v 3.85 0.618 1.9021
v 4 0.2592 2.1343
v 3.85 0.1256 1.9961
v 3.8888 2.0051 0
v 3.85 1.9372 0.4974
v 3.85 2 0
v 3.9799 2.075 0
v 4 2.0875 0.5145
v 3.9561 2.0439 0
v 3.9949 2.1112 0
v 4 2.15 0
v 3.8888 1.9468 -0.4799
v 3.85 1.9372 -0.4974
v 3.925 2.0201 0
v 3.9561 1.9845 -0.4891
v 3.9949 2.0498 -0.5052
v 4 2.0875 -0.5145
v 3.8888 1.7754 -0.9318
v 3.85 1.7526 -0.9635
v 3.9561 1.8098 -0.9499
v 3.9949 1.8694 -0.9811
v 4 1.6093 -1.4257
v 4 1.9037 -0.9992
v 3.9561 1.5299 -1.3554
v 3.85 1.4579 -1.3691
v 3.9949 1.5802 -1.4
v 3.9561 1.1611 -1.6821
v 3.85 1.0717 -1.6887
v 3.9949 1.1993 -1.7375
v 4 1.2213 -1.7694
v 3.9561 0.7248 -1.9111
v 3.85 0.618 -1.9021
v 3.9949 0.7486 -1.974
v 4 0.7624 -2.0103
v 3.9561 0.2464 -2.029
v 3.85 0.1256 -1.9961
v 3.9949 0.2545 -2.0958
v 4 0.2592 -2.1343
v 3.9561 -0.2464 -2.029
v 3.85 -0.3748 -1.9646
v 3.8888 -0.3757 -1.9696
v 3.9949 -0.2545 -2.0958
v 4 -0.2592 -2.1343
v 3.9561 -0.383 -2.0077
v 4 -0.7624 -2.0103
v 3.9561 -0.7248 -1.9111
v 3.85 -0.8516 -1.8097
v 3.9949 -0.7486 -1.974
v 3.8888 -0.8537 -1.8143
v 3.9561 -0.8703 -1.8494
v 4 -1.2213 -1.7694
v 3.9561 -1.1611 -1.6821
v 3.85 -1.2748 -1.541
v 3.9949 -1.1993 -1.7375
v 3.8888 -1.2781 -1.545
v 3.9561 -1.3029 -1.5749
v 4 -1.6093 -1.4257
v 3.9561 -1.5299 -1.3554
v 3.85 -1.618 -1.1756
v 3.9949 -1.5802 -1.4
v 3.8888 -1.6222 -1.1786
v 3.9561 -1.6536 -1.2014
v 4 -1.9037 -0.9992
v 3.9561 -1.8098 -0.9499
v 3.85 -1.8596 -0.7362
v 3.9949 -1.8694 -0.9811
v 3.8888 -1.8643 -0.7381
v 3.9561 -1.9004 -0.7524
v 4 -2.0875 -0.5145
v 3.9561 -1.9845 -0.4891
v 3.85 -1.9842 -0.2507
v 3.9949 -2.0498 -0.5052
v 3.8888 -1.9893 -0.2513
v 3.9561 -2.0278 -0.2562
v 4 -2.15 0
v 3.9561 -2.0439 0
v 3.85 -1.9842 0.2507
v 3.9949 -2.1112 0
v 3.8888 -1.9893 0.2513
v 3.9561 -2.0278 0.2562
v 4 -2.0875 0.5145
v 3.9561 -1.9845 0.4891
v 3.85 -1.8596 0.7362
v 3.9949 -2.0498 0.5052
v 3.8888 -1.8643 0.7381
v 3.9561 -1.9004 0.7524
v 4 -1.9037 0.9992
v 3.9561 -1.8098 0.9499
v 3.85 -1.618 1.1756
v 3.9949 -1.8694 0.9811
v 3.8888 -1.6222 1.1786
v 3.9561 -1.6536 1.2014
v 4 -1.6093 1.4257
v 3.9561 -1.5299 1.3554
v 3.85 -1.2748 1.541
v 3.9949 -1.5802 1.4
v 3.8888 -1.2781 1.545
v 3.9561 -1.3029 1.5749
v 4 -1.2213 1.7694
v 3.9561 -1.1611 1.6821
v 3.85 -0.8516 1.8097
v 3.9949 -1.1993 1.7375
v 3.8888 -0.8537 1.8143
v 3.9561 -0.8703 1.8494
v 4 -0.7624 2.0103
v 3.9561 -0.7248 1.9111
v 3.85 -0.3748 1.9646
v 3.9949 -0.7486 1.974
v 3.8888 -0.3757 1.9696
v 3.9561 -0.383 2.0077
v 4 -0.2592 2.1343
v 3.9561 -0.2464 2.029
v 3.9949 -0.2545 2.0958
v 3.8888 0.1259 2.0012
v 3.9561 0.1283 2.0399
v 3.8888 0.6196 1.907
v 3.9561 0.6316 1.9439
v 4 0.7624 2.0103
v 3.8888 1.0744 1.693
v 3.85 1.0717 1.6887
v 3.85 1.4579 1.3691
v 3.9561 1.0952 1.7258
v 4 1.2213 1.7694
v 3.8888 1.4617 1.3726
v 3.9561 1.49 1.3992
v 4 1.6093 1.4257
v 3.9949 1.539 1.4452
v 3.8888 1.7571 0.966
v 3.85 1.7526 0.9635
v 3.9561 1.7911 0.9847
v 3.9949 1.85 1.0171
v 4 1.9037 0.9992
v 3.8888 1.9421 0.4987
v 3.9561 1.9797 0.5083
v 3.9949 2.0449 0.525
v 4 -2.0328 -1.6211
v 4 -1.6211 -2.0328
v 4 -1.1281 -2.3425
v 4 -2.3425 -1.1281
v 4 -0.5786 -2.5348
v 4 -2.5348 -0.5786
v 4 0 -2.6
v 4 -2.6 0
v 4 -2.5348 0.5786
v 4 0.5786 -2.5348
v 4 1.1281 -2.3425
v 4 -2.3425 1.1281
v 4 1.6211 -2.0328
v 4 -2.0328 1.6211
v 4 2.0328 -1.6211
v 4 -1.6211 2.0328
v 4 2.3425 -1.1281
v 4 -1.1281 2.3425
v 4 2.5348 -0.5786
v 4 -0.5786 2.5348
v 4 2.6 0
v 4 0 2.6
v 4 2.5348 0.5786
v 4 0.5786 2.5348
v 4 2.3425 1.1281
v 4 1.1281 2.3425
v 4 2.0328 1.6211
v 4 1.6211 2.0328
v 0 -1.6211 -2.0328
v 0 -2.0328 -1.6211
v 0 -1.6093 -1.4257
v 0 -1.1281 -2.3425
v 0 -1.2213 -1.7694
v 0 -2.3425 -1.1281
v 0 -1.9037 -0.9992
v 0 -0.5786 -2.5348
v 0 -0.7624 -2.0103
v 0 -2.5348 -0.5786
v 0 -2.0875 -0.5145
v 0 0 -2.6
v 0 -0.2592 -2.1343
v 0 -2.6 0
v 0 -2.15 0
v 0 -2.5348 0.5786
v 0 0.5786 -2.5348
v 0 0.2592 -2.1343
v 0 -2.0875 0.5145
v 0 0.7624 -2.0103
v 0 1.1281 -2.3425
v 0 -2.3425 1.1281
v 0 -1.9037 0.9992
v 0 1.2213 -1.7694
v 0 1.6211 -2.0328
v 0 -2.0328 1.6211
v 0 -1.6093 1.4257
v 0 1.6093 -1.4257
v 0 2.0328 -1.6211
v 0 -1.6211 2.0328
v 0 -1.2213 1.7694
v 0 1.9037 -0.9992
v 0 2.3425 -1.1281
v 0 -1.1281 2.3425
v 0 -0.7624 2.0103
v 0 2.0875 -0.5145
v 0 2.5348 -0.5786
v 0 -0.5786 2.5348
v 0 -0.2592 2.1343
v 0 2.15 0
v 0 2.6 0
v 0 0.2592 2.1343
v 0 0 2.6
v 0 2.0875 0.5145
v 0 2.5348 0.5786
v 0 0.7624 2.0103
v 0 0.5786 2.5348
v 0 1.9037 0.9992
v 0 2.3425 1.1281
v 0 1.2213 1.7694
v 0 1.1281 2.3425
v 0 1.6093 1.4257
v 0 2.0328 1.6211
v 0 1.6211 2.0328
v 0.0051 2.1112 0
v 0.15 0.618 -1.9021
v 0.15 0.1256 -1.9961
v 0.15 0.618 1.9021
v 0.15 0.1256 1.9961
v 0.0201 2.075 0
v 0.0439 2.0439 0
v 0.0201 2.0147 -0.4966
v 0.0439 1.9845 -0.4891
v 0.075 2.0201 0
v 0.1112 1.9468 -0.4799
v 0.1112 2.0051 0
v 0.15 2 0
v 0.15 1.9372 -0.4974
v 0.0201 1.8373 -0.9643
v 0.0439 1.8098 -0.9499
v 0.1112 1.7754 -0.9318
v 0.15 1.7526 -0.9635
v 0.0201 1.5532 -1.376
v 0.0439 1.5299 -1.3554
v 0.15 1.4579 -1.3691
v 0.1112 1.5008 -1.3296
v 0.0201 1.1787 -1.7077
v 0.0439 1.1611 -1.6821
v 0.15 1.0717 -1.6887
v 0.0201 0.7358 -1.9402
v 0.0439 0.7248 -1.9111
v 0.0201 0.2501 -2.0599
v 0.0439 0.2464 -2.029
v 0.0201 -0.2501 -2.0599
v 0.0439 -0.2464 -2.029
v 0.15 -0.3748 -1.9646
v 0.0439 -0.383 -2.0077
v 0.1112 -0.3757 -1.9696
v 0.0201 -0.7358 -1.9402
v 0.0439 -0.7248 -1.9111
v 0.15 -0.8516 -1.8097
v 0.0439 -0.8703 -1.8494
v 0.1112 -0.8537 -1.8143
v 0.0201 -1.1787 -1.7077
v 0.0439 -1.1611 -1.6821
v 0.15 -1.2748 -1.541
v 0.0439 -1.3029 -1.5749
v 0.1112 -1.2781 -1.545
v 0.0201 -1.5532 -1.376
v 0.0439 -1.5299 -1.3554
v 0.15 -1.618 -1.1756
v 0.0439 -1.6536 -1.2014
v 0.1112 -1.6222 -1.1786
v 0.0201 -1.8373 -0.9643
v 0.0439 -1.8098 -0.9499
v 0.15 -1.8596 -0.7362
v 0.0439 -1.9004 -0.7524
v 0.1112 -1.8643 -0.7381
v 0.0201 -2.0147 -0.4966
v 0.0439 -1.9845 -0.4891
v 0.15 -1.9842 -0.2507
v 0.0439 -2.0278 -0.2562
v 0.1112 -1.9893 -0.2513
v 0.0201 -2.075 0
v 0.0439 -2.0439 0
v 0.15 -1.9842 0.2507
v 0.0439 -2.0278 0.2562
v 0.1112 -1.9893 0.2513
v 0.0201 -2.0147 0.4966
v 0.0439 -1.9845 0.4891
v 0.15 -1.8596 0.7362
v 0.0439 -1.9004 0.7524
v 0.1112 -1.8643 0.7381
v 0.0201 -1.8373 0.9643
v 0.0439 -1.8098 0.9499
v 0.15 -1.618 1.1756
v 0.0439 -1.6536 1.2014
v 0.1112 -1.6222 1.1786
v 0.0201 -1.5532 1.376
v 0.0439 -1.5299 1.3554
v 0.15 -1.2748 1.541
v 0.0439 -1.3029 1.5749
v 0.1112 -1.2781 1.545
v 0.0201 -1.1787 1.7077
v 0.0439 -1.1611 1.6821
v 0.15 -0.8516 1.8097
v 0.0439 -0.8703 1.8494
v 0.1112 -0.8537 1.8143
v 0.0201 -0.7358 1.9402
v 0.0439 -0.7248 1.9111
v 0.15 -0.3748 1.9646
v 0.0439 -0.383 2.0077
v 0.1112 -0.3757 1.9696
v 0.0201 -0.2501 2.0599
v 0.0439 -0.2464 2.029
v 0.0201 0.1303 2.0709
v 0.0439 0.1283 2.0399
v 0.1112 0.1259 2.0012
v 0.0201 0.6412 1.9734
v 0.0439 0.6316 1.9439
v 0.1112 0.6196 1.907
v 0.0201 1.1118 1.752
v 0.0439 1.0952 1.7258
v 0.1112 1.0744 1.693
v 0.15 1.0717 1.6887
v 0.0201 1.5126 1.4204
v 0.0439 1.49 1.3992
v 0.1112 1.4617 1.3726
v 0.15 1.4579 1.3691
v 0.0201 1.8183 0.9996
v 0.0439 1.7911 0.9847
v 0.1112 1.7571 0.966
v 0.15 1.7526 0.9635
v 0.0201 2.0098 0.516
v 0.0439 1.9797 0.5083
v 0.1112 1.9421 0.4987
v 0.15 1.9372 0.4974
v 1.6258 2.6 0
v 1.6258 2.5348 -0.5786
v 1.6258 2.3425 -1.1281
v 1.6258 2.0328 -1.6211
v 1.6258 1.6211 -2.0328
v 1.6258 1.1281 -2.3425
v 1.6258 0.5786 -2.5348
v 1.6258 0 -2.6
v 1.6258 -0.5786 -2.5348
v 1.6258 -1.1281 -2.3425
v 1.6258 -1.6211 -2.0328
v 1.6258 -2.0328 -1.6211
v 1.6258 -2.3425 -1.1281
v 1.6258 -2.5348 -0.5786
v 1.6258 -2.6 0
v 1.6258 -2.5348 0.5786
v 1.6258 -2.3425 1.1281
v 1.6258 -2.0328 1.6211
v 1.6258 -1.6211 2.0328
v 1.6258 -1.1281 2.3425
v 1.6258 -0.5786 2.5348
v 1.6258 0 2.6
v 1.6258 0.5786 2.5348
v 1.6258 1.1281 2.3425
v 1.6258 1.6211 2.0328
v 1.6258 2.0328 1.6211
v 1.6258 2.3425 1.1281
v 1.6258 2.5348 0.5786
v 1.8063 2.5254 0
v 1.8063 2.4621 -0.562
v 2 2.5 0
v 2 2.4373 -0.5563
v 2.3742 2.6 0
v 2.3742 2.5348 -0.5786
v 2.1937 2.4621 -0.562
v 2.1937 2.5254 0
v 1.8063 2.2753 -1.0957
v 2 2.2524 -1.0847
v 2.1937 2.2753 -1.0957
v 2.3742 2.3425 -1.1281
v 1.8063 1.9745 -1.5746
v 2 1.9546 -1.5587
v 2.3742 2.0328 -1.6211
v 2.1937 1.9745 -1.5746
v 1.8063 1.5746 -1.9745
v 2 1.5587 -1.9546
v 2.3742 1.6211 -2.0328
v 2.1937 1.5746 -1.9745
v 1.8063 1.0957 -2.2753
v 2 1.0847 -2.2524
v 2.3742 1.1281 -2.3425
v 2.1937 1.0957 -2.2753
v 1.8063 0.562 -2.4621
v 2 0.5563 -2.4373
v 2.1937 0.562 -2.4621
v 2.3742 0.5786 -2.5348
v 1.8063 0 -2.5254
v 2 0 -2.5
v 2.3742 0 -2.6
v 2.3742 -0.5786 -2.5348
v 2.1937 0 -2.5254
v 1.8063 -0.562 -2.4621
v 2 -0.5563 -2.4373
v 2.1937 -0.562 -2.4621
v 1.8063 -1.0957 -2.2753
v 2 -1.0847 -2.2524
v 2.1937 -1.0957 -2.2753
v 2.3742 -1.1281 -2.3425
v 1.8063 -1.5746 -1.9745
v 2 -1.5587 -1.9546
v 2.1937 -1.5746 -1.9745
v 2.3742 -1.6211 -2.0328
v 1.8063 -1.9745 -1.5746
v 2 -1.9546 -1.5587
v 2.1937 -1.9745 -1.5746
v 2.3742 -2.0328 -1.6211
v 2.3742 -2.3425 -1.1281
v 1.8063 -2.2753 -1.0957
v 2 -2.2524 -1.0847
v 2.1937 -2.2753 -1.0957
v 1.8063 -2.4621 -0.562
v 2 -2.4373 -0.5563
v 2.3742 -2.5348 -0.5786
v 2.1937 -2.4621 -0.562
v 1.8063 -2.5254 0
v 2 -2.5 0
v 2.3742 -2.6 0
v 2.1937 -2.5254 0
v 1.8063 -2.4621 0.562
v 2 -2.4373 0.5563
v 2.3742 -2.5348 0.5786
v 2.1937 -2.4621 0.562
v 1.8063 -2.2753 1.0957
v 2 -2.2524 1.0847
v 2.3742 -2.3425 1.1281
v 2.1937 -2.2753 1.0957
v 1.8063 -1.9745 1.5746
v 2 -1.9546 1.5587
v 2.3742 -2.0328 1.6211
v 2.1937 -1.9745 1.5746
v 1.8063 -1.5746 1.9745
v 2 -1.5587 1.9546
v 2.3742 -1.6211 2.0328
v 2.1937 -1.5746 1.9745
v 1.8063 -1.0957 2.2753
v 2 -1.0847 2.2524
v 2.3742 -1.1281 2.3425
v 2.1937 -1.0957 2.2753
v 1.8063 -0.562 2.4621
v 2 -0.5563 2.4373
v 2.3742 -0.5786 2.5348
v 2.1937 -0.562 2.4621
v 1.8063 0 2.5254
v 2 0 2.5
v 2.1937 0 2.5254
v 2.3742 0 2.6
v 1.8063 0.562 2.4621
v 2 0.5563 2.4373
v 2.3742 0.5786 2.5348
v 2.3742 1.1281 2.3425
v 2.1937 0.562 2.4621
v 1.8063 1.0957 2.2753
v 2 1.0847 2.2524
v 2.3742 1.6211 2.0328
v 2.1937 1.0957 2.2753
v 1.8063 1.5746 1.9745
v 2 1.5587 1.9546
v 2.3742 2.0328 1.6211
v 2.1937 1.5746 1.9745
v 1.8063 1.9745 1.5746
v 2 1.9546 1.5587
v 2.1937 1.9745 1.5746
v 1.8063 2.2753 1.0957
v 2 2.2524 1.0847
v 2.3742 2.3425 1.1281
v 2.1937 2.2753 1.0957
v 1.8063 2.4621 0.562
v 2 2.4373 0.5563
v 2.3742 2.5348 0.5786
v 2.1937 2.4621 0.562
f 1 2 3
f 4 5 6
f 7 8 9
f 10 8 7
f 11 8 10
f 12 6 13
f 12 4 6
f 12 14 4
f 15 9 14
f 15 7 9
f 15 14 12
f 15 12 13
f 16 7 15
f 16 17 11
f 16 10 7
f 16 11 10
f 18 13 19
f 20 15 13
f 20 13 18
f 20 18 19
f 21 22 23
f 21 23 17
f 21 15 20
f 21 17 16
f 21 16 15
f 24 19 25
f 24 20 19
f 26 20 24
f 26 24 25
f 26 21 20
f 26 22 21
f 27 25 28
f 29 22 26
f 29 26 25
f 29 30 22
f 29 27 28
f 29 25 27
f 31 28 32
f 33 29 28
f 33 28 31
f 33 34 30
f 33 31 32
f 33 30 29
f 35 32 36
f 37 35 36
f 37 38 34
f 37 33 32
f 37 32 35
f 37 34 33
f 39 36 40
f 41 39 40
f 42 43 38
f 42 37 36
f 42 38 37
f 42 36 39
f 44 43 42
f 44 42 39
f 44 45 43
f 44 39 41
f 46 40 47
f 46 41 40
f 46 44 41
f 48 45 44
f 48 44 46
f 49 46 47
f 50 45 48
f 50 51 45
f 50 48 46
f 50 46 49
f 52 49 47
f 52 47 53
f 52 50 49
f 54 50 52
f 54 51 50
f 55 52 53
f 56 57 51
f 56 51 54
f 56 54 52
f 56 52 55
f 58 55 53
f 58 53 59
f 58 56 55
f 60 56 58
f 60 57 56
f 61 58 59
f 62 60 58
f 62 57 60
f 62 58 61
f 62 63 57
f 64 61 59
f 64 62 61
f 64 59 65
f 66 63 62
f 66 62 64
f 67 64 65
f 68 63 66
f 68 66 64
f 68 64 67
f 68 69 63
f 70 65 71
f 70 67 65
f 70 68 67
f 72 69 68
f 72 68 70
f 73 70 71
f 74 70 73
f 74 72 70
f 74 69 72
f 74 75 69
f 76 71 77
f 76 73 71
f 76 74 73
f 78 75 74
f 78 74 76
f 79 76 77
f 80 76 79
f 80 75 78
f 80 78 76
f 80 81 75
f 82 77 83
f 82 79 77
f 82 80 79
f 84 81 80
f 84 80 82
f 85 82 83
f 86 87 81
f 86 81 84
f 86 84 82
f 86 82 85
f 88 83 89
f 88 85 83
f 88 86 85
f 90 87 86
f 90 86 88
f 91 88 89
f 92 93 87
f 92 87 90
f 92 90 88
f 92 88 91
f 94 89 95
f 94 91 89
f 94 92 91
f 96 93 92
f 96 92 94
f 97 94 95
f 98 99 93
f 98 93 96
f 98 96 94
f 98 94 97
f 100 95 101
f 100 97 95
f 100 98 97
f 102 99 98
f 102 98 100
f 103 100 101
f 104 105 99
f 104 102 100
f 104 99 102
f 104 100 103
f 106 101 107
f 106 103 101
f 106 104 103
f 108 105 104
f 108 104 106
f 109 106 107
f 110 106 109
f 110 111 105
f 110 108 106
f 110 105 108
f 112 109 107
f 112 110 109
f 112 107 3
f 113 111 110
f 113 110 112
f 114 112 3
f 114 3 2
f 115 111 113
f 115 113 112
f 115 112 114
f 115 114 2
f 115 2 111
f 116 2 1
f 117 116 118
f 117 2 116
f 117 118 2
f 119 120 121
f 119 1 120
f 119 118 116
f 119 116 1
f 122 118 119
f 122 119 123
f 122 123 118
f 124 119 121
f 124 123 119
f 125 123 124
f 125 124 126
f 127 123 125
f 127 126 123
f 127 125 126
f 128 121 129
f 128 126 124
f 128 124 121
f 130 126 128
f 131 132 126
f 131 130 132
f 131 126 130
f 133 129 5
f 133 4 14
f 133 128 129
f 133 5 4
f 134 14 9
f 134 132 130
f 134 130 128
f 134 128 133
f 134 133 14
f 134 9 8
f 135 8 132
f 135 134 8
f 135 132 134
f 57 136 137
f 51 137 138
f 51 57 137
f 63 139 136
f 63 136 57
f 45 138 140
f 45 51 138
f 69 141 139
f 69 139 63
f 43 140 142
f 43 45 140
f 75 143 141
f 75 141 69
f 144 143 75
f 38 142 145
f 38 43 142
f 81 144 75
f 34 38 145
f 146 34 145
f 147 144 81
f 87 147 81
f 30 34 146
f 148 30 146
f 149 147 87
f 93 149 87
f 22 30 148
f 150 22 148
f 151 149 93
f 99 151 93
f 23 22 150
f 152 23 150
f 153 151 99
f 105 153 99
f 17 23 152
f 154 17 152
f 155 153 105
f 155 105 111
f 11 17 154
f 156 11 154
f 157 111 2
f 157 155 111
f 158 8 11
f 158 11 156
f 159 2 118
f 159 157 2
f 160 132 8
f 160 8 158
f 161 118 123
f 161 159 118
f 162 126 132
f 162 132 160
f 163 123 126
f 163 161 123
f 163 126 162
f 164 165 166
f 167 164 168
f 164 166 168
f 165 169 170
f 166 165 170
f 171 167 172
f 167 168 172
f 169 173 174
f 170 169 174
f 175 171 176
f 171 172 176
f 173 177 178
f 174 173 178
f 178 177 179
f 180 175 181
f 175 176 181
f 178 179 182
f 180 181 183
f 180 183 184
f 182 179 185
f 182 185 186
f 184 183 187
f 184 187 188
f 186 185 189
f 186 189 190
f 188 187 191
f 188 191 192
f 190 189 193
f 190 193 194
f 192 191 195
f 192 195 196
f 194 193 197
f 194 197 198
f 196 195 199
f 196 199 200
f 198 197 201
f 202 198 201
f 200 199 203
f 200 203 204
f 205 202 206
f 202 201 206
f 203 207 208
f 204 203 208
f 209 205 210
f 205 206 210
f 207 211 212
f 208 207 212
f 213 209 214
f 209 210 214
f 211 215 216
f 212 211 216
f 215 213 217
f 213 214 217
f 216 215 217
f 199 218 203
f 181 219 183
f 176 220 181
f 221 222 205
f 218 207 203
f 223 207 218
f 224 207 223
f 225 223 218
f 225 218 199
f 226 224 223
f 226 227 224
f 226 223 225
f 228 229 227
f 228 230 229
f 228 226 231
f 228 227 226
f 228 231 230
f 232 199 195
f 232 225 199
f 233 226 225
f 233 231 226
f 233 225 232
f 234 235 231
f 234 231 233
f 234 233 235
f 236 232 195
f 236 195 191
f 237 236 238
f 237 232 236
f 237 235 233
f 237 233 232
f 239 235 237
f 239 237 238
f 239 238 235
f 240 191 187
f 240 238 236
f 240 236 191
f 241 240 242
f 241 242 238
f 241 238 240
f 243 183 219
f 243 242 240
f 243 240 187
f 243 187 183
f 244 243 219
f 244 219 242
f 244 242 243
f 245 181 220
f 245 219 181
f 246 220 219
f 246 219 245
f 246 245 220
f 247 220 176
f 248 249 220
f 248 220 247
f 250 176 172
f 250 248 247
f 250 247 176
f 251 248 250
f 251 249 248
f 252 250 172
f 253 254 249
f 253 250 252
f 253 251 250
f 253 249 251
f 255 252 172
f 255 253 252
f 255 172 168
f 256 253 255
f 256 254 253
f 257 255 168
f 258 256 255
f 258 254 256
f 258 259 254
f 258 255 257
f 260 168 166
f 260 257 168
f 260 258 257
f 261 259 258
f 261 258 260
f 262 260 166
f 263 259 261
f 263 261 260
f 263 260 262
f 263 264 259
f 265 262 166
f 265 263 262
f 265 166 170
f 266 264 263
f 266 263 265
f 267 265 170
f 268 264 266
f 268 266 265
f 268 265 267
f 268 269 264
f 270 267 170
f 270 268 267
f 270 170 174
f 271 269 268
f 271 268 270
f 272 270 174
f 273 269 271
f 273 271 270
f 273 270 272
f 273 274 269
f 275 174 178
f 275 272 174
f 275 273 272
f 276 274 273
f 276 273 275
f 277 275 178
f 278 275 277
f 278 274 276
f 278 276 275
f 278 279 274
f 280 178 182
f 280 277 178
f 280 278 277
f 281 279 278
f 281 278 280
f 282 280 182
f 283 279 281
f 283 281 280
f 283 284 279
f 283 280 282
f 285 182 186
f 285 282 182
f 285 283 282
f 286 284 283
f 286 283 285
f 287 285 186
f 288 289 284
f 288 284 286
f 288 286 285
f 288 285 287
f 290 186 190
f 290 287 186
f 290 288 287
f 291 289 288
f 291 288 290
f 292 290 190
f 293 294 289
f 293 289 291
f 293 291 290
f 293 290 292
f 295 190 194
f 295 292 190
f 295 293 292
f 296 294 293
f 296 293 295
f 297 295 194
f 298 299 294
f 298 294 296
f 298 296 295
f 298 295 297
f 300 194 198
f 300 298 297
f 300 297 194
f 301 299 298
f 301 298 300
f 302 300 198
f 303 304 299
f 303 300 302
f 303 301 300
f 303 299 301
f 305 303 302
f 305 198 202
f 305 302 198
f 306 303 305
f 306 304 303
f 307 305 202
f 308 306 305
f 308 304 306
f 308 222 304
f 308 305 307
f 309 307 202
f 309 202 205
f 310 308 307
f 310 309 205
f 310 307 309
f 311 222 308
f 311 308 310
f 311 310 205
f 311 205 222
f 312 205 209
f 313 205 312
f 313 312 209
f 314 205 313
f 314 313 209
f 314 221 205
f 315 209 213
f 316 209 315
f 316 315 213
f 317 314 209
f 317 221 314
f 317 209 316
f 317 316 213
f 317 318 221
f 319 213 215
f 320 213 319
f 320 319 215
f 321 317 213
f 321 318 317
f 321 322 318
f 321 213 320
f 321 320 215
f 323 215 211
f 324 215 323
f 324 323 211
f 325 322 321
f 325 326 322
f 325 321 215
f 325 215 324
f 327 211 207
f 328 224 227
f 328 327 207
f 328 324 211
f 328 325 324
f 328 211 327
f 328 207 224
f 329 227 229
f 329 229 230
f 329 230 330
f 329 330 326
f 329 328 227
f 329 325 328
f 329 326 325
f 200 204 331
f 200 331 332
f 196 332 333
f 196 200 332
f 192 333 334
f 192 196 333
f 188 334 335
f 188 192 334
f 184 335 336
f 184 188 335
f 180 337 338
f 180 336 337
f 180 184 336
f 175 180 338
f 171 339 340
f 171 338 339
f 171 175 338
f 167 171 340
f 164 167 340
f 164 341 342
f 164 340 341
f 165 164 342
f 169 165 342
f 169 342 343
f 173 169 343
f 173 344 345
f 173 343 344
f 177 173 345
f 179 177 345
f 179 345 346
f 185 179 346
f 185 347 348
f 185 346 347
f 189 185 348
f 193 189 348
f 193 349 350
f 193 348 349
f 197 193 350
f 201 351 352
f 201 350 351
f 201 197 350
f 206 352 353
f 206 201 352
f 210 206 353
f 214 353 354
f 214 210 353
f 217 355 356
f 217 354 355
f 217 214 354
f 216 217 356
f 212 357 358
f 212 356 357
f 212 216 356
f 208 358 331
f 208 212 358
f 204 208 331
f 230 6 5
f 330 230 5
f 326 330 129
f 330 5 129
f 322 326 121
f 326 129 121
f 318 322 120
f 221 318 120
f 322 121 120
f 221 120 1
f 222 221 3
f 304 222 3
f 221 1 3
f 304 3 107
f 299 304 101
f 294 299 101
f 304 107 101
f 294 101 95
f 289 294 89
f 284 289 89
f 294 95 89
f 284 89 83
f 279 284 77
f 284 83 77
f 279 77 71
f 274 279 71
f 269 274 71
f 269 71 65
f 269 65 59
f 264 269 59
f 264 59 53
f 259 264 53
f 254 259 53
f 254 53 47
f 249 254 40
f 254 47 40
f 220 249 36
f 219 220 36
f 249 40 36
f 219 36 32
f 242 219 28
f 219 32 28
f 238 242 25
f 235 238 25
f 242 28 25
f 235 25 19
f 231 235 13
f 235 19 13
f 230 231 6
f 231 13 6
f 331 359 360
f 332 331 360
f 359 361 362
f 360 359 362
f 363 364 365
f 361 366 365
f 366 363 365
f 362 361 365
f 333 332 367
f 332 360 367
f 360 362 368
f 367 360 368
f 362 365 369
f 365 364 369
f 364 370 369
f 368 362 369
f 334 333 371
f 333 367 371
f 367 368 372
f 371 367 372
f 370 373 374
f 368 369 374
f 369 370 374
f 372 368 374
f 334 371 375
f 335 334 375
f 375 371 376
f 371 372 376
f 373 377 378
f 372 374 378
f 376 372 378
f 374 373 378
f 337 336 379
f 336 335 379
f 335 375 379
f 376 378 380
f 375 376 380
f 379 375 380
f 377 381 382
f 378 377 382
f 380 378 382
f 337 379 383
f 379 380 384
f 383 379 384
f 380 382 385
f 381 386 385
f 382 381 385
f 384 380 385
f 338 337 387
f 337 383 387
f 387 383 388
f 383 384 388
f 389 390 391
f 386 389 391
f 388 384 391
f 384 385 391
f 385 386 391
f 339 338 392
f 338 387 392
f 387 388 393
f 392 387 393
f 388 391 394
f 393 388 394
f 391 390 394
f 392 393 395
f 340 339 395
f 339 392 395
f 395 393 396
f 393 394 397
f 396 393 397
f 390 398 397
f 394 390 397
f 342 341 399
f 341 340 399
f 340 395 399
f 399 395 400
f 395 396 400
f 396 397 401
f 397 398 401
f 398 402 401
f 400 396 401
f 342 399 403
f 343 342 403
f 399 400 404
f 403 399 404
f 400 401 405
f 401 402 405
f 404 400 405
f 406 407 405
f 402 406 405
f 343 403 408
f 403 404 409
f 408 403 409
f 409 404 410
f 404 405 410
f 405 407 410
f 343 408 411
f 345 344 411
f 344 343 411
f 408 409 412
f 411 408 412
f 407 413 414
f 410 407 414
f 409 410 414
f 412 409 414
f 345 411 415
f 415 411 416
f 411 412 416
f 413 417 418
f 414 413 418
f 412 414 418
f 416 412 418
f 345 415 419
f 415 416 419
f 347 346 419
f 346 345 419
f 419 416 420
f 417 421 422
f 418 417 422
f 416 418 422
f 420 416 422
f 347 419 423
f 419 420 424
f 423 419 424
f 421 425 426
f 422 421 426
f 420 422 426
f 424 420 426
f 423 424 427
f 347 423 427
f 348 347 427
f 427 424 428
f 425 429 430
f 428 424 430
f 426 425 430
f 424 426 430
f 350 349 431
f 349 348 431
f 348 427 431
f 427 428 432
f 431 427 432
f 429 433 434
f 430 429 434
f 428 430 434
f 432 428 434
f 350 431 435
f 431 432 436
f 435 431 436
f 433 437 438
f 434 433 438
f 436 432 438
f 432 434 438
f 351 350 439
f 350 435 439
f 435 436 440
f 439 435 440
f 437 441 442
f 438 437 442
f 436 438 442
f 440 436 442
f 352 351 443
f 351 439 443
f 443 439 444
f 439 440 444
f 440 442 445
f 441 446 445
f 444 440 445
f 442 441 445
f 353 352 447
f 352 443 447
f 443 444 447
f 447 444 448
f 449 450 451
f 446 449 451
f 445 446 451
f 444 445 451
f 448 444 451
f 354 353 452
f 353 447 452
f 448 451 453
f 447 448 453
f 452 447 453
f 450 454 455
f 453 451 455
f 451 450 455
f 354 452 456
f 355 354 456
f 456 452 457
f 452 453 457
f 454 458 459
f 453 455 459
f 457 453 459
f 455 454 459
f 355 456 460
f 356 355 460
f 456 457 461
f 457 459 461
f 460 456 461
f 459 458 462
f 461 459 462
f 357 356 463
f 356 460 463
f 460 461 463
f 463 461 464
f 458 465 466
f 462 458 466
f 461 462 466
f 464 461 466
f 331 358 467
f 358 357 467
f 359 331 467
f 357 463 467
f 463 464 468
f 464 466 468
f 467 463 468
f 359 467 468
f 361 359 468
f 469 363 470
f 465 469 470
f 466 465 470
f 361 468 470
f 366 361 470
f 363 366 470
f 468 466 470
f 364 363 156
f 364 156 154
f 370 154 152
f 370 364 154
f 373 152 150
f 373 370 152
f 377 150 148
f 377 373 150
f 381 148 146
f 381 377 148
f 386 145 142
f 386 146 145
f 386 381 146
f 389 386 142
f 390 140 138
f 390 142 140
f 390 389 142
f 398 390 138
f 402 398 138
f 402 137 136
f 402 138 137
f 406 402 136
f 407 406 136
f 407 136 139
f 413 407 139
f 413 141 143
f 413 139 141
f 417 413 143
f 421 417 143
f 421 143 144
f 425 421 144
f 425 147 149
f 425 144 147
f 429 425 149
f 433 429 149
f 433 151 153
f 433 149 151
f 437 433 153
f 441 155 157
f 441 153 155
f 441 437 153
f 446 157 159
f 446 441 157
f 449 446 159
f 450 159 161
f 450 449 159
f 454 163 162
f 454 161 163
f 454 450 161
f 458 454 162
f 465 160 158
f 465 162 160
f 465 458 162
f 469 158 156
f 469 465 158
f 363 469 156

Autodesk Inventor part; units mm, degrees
sketch "Sketch_1" plane through (0, 0, 0) normal (0, 0, 1) x (1, 0, 0)
  line L0 (4, 0) -> (0, 0)
  arc A0 (0, 2.15) -> (0.15, 2) centre (0.15, 2.15) ccw
  line L1 (0.15, 2) -> (3.85, 2)
  arc A1 (3.85, 2) -> (4, 2.15) centre (3.85, 2.15) ccw
  line L2 (4, 2.15) -> (4, 2.6)
  line L3 (4, 2.6) -> (2.3742, 2.6)
  arc A2 (1.6258, 2.6) -> (2.3742, 2.6) centre (2, 3.25) ccw
  line L4 (1.6258, 2.6) -> (0, 2.6)
  line L5 (0, 2.6) -> (0, 2.15)
revolve "Revolution1" add sketch "Sketch_1" angle 360 about axis through (4, 0, 0) along (1, 0, 0)
ref_plane "ip_st_ir_1_1_XY" through (2, 3.25, 0) normal (1, 0, 0) x (0, 0, -1)
ref_plane "ip_st_ir_1_1_YZ" through (2, 3.25, 0) normal (0, 0, -1) x (0, 1, 0)
ref_plane "ip_st_ir_1_1_ZX" through (2, 3.25, 0) normal (0, 1, 0) x (1, 0, 0)
ref_plane "ip_st_ir_1_10_XY" through (2, 2.6293, -1.9103) normal (1, 0, 0) x (0, 0, -1)
ref_plane "ip_st_ir_1_10_YZ" through (2, 2.6293, -1.9103) normal (0, 0, -1) x (0, 1, 0)
ref_plane "ip_st_ir_1_10_ZX" through (2, 2.6293, -1.9103) normal (0, 1, 0) x (1, 0, 0)
ref_plane "ip_st_ir_1_2_XY" through (2, 2.6293, 1.9103) normal (1, 0, 0) x (0, 0, -1)
ref_plane "ip_st_ir_1_2_YZ" through (2, 2.6293, 1.9103) normal (0, 0, -1) x (0, 1, 0)
ref_plane "ip_st_ir_1_2_ZX" through (2, 2.6293, 1.9103) normal (0, 1, 0) x (1, 0, 0)
ref_plane "ip_st_ir_1_3_XY" through (2, 1.0043, 3.0909) normal (1, 0, 0) x (0, 0, -1)
ref_plane "ip_st_ir_1_3_YZ" through (2, 1.0043, 3.0909) normal (0, 0, -1) x (0, 1, 0)
ref_plane "ip_st_ir_1_3_ZX" through (2, 1.0043, 3.0909) normal (0, 1, 0) x (1, 0, 0)
ref_plane "ip_st_ir_1_4_XY" through (2, -1.0043, 3.0909) normal (1, 0, 0) x (0, 0, -1)
ref_plane "ip_st_ir_1_4_YZ" through (2, -1.0043, 3.0909) normal (0, 0, -1) x (0, 1, 0)
ref_plane "ip_st_ir_1_4_ZX" through (2, -1.0043, 3.0909) normal (0, 1, 0) x (1, 0, 0)
ref_plane "ip_st_ir_1_5_XY" through (2, -2.6293, 1.9103) normal (1, 0, 0) x (0, 0, -1)
ref_plane "ip_st_ir_1_5_YZ" through (2, -2.6293, 1.9103) normal (0, 0, -1) x (0, 1, 0)
ref_plane "ip_st_ir_1_5_ZX" through (2, -2.6293, 1.9103) normal (0, 1, 0) x (1, 0, 0)
ref_plane "ip_st_ir_1_6_XY" through (2, -3.25, 0) normal (1, 0, 0) x (0, 0, -1)
ref_plane "ip_st_ir_1_6_YZ" through (2, -3.25, 0) normal (0, 0, -1) x (0, 1, 0)
ref_plane "ip_st_ir_1_6_ZX" through (2, -3.25, 0) normal (0, 1, 0) x (1, 0, 0)
ref_plane "ip_st_ir_1_7_XY" through (2, -2.6293, -1.9103) normal (1, 0, 0) x (0, 0, -1)
ref_plane "ip_st_ir_1_7_YZ" through (2, -2.6293, -1.9103) normal (0, 0, -1) x (0, 1, 0)
ref_plane "ip_st_ir_1_7_ZX" through (2, -2.6293, -1.9103) normal (0, 1, 0) x (1, 0, 0)
ref_plane "ip_st_ir_1_8_XY" through (2, -1.0043, -3.0909) normal (1, 0, 0) x (0, 0, -1)
ref_plane "ip_st_ir_1_8_YZ" through (2, -1.0043, -3.0909) normal (0, 0, -1) x (0, 1, 0)
ref_plane "ip_st_ir_1_8_ZX" through (2, -1.0043, -3.0909) normal (0, 1, 0) x (1, 0, 0)
ref_plane "ip_st_ir_1_9_XY" through (2, 1.0043, -3.0909) normal (1, 0, 0) x (0, 0, -1)
ref_plane "ip_st_ir_1_9_YZ" through (2, 1.0043, -3.0909) normal (0, 0, -1) x (0, 1, 0)
ref_plane "ip_st_ir_1_9_ZX" through (2, 1.0043, -3.0909) normal (0, 1, 0) x (1, 0, 0)
ref_plane "ip_st_ir_1a_XY" through (0, 0, 0) normal (1, 0, 0) x (0, 0, -1)
ref_plane "ip_st_ir_1a_YZ" through (0, 0, 0) normal (0, 0, -1) x (0, 1, 0)
ref_plane "ip_st_ir_1a_ZX" through (0, 0, 0) normal (0, 1, 0) x (1, 0, 0)
ref_plane "ip_st_ir_2a_XY" through (0.2656, 0, 0) normal (1, 0, 0) x (0, 0, -1)
ref_plane "ip_st_ir_2a_YZ" through (0.2656, 0, 0) normal (0, 0, -1) x (0, 1, 0)
ref_plane "ip_st_ir_2a_ZX" through (0.2656, 0, 0) normal (0, 1, 0) x (1, 0, 0)
properties part number "684AZZ Inner Ring"
